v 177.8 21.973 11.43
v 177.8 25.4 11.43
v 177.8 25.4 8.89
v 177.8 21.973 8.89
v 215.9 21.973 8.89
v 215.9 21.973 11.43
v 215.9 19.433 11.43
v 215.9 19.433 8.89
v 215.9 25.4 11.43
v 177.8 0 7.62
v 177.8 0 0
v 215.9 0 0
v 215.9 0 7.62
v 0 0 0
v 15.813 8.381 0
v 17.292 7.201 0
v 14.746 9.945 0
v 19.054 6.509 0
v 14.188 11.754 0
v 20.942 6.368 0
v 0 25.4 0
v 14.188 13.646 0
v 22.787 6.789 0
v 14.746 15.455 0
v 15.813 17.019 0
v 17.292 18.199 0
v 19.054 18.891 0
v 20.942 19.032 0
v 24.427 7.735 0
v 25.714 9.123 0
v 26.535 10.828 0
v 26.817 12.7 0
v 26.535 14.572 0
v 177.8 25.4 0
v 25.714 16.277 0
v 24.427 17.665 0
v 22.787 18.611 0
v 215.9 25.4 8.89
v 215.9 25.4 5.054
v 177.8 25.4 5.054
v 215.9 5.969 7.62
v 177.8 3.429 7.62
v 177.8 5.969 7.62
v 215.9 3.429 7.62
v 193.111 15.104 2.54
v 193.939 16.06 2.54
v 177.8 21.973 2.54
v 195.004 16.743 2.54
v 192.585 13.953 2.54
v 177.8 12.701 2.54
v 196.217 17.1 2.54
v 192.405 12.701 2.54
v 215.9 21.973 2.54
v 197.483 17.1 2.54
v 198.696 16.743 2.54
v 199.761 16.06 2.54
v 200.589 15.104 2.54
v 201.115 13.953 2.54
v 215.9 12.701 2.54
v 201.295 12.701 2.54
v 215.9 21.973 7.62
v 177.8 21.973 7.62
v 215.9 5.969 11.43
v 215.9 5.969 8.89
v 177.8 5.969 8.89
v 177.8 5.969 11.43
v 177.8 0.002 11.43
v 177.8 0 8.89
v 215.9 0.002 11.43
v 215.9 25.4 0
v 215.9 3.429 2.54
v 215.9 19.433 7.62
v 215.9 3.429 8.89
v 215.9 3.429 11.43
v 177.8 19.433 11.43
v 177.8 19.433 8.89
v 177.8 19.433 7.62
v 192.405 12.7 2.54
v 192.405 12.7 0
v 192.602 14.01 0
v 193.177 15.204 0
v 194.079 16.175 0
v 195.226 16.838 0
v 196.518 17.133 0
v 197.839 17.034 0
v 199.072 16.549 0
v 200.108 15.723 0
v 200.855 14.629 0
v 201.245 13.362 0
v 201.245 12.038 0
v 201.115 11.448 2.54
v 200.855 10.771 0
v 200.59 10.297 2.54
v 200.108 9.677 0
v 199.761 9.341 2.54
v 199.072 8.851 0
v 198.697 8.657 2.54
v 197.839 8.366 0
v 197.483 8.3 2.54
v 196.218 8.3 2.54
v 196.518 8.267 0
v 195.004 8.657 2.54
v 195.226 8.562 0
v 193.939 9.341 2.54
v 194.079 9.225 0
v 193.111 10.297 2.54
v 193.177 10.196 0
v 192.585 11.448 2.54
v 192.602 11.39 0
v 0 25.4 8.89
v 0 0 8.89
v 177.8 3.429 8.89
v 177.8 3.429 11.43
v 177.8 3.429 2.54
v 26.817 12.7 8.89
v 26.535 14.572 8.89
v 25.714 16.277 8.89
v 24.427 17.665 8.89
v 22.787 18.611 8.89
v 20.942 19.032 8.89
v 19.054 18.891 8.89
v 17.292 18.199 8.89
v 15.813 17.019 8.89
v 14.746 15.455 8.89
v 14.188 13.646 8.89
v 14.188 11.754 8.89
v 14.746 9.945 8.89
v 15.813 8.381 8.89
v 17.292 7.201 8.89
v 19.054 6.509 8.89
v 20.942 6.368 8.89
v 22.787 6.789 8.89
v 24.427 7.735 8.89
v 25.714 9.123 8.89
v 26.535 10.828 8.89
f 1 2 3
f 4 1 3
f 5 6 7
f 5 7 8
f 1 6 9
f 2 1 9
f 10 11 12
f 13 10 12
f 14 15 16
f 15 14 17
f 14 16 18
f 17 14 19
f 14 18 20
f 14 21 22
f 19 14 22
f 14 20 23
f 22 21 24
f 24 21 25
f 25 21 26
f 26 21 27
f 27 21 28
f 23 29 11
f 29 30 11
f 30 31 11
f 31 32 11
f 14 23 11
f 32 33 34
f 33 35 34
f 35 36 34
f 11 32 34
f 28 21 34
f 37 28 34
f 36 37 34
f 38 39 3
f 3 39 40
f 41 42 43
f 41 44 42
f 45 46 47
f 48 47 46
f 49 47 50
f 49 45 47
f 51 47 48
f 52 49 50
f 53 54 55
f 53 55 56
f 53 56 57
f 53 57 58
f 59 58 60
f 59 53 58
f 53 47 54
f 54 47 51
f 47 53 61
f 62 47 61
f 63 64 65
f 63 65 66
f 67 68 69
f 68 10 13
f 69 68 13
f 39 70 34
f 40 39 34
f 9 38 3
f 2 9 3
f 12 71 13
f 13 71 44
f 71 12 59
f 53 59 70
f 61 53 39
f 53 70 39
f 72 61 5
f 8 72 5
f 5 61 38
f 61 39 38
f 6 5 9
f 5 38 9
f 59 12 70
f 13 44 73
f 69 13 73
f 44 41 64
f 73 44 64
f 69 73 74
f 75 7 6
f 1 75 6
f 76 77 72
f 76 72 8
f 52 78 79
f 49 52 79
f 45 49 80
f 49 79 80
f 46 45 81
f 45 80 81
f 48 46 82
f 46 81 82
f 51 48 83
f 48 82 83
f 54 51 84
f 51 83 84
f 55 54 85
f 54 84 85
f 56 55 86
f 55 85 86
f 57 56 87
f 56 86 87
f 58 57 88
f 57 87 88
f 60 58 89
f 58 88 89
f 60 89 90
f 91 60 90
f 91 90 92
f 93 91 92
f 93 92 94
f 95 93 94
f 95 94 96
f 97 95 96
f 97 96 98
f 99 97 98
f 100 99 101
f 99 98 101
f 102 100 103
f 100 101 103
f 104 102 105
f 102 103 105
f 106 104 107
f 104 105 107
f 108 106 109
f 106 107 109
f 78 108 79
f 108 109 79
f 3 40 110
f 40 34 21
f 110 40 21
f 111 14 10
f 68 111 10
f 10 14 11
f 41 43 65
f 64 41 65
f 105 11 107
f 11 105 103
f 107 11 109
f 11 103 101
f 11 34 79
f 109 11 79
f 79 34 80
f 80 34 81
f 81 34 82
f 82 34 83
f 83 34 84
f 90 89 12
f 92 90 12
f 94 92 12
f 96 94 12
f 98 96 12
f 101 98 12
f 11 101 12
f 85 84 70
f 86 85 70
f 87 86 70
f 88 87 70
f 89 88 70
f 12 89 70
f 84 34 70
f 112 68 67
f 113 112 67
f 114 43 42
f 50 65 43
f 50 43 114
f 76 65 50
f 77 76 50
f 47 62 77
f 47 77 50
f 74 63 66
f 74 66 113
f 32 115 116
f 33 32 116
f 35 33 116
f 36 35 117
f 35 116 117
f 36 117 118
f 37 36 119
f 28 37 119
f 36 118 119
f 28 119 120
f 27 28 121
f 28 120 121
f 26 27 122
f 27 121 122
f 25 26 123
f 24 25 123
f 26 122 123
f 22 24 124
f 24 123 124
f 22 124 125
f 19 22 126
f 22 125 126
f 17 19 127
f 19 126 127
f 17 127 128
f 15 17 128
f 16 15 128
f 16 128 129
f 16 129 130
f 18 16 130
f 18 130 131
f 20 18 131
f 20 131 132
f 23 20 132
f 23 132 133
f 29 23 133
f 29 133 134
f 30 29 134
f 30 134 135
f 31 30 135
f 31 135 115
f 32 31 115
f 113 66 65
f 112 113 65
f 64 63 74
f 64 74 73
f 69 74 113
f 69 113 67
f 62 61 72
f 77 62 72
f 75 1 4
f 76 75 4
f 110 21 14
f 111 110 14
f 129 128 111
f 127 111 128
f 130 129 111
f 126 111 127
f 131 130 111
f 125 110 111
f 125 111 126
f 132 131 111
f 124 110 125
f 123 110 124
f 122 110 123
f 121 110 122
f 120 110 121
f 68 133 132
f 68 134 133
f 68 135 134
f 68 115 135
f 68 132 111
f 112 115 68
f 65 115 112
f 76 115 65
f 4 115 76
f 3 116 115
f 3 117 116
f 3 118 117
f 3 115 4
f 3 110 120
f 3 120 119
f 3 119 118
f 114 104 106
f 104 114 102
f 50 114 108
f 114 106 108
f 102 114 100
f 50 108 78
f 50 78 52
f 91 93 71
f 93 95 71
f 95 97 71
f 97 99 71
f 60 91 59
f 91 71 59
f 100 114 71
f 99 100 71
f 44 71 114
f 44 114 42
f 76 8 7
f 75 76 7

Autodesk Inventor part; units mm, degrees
ref_plane "YZ Plane" through (0, 0, 0) normal (1, 0, 0) x (0, 1, 0)
ref_plane "XZ Plane" through (0, 0, 0) normal (0, 1, 0) x (-1, 0, 0)
ref_plane "XY Plane" through (0, 0, 0) normal (0, 0, 1) x (1, 0, 0)
sketch "Sketch1" plane through (0, 0, 0) normal (0, 0, 1) x (1, 0, 0)
  line L0 (0, 0) -> (215.9, 0)
  line L1 (215.9, 0) -> (215.9, 25.4)
  line L2 (215.9, 25.4) -> (0, 25.4)
  line L3 (0, 25.4) -> (0, 0)
  dimension "d0" = 215.9
  dimension "d1" = 25.4
extrude "Extrusion1" add sketch "Sketch1" along normal blind 8.89
sketch "Sketch2" plane through (0, 0, 8.89) normal (0, 0, 1) x (1, 0, 0)
  line L0 (0, 0) -> (215.9, 0) projected
  line L1 (215.9, 25.4) -> (0, 25.4) projected
  line L2 (0, 25.4) -> (0, 0) projected
  line L3 (215.9, 25.4) -> (177.8, 25.4)
  line L4 (177.8, 25.4) -> (177.8, 0)
  line L5 (177.8, 0) -> (215.9, 0)
  line L6 (215.9, 0) -> (215.9, 25.4)
  line L7 (177.8, 0) -> (215.9, 0)
  line L8 (215.9, 0) -> (215.9, 12.7)
  line L9 (215.9, 12.7) -> (177.8, 12.7)
  line L10 (177.8, 12.7) -> (177.8, 0)
  line L11 (177.8, 12.7) -> (215.9, 12.7)
  line L12 (215.9, 12.7) -> (215.9, 3.429)
  line L13 (215.9, 3.429) -> (177.8, 3.429)
  line L14 (177.8, 3.429) -> (177.8, 12.7)
  line L15 (177.8, 12.7) -> (215.9, 12.7)
  line L16 (215.9, 12.7) -> (215.9, 21.971)
  line L17 (215.9, 21.971) -> (177.8, 21.971)
  line L18 (177.8, 21.971) -> (177.8, 12.7)
  line L19 (215.9, 25.4) -> (177.8, 25.4)
  line L20 (177.8, 25.4) -> (177.8, 21.971)
  line L21 (177.8, 21.971) -> (215.9, 21.971)
  line L22 (215.9, 21.971) -> (215.9, 25.4)
  dimension "d4" = 38.1
  dimension "d5" = 9.271
  dimension "d6" = 9.271
extrude "Extrusion2" add sketch "Sketch2" along normal blind 8.89 contours L4 L13 L6 L0
sketch "Sketch3" plane through (0, 0, 8.89) normal (0, 0, 1) x (1, 0, 0)
  line L0 (215.9, 25.4) -> (177.8, 25.4)
  line L1 (177.8, 25.4) -> (177.8, 21.9726)
  line L2 (177.8, 21.9726) -> (215.9, 21.9726)
  line L3 (215.9, 21.9726) -> (215.9, 25.4)
extrude "Extrusion3" add sketch "Sketch3" along normal blind 8.89
sketch "Sketch4" plane through (177.8, 3.429, 8.89) normal (0, 1, 0) x (1, 0, 0)
  line L0 (38.1, 0) -> (38.1, -8.89) projected
  line L1 (0, 0) -> (38.1, 0)
  line L2 (38.1, 0) -> (38.1, -5.08)
  line L3 (38.1, -5.08) -> (0, -5.08)
  line L4 (0, -5.08) -> (0, 0)
  line L5 (38.1, -5.08) -> (0, -5.08)
  line L6 (0, -5.08) -> (0, -8.89)
  line L7 (0, -8.89) -> (38.1, -8.89)
  line L8 (38.1, -8.89) -> (38.1, -5.08)
  point P0 (-177.8, 8.89)
  dimension "d11" = 5.08
extrude "Extrusion4" add sketch "Sketch4" along normal blind 2.54 contours L0 L7 L6 L3
sketch "Sketch5" plane through (177.8, 21.9726, 8.89) normal (0, -1, 0) x (1, 0, 0)
  line L0 (38.1, 0) -> (38.1, 8.89) projected
  line L1 (0, 0) -> (38.1, 0)
  line L2 (38.1, 0) -> (38.1, 5.08)
  line L3 (38.1, 5.08) -> (0, 5.08)
  line L4 (0, 5.08) -> (0, 0)
  line L5 (0, 5.08) -> (38.1, 5.08)
  line L6 (38.1, 5.08) -> (38.1, 8.89)
  line L7 (38.1, 8.89) -> (0, 8.89)
  line L8 (0, 8.89) -> (0, 5.08)
  point P0 (-177.8, -8.89)
  dimension "d14" = 5.08
extrude "Extrusion5" add sketch "Sketch5" along normal blind 2.54 contours L3 L8 L7 L0
sketch "Sketch6" plane through (215.9, 0, 0) normal (1, 0, 0) x (0, 0, -1)
  line L0 (0, 0) -> (0, 25.4) projected
  line L1 (0, 25.4) -> (-17.78, 25.4) projected
  line L2 (-13.97, 19.4326) -> (-17.78, 19.4326) projected
  line L3 (-13.97, 21.9726) -> (-13.97, 19.4326) projected
  line L4 (-13.97, 3.429) -> (-13.97, 5.969) projected
  line L5 (-17.78, 5.969) -> (-13.97, 5.969) projected
  line L6 (-8.89, 25.4) -> (-5.054, 25.4)
  line L7 (-2.54, 21.9726) -> (-7.62, 21.9726)
  line L8 (-7.62, 21.9726) -> (-7.62, 19.4326)
  line L9 (-2.54, 21.9726) -> (-2.54, 12.7008)
  line L10 (-7.62, 19.4326) -> (-11.43, 19.4326)
  line L11 (-11.43, 19.4326) -> (-11.43, 25.4)
  line L12 (-2.54, 12.7008) -> (-7.9346, 12.7008) construction
  line L13 (-2.54, 3.429) -> (-7.62, 3.429)
  line L14 (-7.62, 3.429) -> (-7.62, 5.969)
  line L15 (-2.54, 3.429) -> (-2.54, 12.7008)
  line L16 (-7.62, 5.969) -> (-11.43, 5.969)
  line L17 (-11.43, 5.969) -> (-11.43, 0.0016)
  line L18 (0, 0) -> (-17.78, 0)
  line L19 (-17.78, 0) -> (-17.78, 25.4)
  line L20 (-17.78, 25.4) -> (0, 25.4)
  line L21 (0, 25.4) -> (0, 0)
  line L22 (-8.89, 19.4326) -> (-8.89, 5.969)
  line L23 (-17.78, 5.969) -> (-13.97, 5.969)
  line L24 (-13.97, 5.969) -> (-13.97, 3.429)
  line L25 (-13.97, 3.429) -> (-11.43, 3.429)
  line L26 (-17.78, 19.4326) -> (-13.97, 19.4326)
  line L27 (-13.97, 19.4326) -> (-13.97, 21.9726)
  line L28 (-13.97, 21.9726) -> (-11.43, 21.9726)
  line L29 (-11.43, 5.969) -> (-7.62, 5.969)
  line L30 (-7.62, 5.969) -> (-7.62, 0)
  line L31 (-7.62, 0) -> (-11.43, 0)
  line L32 (-11.43, 0) -> (-11.43, 5.969)
  dimension "d19" = 3.81
extrude "Extrusion6" add sketch "Sketch6" against normal up to surface (38.1 mm away) contours L18 L30 L13 L15 L9 L7 L8 L10 L11 L1 L0 | L18 L17 L16 L14 L30
extrude "Extrusion7" cut sketch "Sketch6" against normal up to surface (38.1 mm away) contours L18 L19 L5 L4 L25 L17 | L14 L16 L22 L10 L8 L7 L9 L15 L13 | L25 L4 L5 L19 L2 L3 L28 L11 L10 L22 L16 L17 | L11 L28 L3 L2 L19 L1
sketch "Sketch7" plane through (0, 0, 0) normal (0, 0, -1) x (-1, 0, 0)
  line L0 (0, 0) -> (-215.9, 0) projected
  line L1 (-215.9, 25.4) -> (-177.8, 25.4)
  line L2 (-177.8, 25.4) -> (-177.8, 0)
  line L3 (-177.8, 0) -> (-215.9, 0)
  line L4 (-215.9, 0) -> (-215.9, 25.4)
  circle A0 centre (-196.85, 12.7) radius 4.445
  dimension "d24" = 38.1
  dimension "d25" = 8.89
extrude "Extrusion8" cut sketch "Sketch7" against normal blind 2.54 contours A0
sketch "Sketch8" plane through (0, 0, 8.89) normal (0, 0, 1) x (1, 0, 0)
  circle A0 centre (20.4674, 12.7) radius 6.35
  dimension "d28" = 12.7
extrude "Extrusion9" cut sketch "Sketch8" against normal blind 25.4
properties part number "Piece Two-Diagonal Piece" material "Steel"
